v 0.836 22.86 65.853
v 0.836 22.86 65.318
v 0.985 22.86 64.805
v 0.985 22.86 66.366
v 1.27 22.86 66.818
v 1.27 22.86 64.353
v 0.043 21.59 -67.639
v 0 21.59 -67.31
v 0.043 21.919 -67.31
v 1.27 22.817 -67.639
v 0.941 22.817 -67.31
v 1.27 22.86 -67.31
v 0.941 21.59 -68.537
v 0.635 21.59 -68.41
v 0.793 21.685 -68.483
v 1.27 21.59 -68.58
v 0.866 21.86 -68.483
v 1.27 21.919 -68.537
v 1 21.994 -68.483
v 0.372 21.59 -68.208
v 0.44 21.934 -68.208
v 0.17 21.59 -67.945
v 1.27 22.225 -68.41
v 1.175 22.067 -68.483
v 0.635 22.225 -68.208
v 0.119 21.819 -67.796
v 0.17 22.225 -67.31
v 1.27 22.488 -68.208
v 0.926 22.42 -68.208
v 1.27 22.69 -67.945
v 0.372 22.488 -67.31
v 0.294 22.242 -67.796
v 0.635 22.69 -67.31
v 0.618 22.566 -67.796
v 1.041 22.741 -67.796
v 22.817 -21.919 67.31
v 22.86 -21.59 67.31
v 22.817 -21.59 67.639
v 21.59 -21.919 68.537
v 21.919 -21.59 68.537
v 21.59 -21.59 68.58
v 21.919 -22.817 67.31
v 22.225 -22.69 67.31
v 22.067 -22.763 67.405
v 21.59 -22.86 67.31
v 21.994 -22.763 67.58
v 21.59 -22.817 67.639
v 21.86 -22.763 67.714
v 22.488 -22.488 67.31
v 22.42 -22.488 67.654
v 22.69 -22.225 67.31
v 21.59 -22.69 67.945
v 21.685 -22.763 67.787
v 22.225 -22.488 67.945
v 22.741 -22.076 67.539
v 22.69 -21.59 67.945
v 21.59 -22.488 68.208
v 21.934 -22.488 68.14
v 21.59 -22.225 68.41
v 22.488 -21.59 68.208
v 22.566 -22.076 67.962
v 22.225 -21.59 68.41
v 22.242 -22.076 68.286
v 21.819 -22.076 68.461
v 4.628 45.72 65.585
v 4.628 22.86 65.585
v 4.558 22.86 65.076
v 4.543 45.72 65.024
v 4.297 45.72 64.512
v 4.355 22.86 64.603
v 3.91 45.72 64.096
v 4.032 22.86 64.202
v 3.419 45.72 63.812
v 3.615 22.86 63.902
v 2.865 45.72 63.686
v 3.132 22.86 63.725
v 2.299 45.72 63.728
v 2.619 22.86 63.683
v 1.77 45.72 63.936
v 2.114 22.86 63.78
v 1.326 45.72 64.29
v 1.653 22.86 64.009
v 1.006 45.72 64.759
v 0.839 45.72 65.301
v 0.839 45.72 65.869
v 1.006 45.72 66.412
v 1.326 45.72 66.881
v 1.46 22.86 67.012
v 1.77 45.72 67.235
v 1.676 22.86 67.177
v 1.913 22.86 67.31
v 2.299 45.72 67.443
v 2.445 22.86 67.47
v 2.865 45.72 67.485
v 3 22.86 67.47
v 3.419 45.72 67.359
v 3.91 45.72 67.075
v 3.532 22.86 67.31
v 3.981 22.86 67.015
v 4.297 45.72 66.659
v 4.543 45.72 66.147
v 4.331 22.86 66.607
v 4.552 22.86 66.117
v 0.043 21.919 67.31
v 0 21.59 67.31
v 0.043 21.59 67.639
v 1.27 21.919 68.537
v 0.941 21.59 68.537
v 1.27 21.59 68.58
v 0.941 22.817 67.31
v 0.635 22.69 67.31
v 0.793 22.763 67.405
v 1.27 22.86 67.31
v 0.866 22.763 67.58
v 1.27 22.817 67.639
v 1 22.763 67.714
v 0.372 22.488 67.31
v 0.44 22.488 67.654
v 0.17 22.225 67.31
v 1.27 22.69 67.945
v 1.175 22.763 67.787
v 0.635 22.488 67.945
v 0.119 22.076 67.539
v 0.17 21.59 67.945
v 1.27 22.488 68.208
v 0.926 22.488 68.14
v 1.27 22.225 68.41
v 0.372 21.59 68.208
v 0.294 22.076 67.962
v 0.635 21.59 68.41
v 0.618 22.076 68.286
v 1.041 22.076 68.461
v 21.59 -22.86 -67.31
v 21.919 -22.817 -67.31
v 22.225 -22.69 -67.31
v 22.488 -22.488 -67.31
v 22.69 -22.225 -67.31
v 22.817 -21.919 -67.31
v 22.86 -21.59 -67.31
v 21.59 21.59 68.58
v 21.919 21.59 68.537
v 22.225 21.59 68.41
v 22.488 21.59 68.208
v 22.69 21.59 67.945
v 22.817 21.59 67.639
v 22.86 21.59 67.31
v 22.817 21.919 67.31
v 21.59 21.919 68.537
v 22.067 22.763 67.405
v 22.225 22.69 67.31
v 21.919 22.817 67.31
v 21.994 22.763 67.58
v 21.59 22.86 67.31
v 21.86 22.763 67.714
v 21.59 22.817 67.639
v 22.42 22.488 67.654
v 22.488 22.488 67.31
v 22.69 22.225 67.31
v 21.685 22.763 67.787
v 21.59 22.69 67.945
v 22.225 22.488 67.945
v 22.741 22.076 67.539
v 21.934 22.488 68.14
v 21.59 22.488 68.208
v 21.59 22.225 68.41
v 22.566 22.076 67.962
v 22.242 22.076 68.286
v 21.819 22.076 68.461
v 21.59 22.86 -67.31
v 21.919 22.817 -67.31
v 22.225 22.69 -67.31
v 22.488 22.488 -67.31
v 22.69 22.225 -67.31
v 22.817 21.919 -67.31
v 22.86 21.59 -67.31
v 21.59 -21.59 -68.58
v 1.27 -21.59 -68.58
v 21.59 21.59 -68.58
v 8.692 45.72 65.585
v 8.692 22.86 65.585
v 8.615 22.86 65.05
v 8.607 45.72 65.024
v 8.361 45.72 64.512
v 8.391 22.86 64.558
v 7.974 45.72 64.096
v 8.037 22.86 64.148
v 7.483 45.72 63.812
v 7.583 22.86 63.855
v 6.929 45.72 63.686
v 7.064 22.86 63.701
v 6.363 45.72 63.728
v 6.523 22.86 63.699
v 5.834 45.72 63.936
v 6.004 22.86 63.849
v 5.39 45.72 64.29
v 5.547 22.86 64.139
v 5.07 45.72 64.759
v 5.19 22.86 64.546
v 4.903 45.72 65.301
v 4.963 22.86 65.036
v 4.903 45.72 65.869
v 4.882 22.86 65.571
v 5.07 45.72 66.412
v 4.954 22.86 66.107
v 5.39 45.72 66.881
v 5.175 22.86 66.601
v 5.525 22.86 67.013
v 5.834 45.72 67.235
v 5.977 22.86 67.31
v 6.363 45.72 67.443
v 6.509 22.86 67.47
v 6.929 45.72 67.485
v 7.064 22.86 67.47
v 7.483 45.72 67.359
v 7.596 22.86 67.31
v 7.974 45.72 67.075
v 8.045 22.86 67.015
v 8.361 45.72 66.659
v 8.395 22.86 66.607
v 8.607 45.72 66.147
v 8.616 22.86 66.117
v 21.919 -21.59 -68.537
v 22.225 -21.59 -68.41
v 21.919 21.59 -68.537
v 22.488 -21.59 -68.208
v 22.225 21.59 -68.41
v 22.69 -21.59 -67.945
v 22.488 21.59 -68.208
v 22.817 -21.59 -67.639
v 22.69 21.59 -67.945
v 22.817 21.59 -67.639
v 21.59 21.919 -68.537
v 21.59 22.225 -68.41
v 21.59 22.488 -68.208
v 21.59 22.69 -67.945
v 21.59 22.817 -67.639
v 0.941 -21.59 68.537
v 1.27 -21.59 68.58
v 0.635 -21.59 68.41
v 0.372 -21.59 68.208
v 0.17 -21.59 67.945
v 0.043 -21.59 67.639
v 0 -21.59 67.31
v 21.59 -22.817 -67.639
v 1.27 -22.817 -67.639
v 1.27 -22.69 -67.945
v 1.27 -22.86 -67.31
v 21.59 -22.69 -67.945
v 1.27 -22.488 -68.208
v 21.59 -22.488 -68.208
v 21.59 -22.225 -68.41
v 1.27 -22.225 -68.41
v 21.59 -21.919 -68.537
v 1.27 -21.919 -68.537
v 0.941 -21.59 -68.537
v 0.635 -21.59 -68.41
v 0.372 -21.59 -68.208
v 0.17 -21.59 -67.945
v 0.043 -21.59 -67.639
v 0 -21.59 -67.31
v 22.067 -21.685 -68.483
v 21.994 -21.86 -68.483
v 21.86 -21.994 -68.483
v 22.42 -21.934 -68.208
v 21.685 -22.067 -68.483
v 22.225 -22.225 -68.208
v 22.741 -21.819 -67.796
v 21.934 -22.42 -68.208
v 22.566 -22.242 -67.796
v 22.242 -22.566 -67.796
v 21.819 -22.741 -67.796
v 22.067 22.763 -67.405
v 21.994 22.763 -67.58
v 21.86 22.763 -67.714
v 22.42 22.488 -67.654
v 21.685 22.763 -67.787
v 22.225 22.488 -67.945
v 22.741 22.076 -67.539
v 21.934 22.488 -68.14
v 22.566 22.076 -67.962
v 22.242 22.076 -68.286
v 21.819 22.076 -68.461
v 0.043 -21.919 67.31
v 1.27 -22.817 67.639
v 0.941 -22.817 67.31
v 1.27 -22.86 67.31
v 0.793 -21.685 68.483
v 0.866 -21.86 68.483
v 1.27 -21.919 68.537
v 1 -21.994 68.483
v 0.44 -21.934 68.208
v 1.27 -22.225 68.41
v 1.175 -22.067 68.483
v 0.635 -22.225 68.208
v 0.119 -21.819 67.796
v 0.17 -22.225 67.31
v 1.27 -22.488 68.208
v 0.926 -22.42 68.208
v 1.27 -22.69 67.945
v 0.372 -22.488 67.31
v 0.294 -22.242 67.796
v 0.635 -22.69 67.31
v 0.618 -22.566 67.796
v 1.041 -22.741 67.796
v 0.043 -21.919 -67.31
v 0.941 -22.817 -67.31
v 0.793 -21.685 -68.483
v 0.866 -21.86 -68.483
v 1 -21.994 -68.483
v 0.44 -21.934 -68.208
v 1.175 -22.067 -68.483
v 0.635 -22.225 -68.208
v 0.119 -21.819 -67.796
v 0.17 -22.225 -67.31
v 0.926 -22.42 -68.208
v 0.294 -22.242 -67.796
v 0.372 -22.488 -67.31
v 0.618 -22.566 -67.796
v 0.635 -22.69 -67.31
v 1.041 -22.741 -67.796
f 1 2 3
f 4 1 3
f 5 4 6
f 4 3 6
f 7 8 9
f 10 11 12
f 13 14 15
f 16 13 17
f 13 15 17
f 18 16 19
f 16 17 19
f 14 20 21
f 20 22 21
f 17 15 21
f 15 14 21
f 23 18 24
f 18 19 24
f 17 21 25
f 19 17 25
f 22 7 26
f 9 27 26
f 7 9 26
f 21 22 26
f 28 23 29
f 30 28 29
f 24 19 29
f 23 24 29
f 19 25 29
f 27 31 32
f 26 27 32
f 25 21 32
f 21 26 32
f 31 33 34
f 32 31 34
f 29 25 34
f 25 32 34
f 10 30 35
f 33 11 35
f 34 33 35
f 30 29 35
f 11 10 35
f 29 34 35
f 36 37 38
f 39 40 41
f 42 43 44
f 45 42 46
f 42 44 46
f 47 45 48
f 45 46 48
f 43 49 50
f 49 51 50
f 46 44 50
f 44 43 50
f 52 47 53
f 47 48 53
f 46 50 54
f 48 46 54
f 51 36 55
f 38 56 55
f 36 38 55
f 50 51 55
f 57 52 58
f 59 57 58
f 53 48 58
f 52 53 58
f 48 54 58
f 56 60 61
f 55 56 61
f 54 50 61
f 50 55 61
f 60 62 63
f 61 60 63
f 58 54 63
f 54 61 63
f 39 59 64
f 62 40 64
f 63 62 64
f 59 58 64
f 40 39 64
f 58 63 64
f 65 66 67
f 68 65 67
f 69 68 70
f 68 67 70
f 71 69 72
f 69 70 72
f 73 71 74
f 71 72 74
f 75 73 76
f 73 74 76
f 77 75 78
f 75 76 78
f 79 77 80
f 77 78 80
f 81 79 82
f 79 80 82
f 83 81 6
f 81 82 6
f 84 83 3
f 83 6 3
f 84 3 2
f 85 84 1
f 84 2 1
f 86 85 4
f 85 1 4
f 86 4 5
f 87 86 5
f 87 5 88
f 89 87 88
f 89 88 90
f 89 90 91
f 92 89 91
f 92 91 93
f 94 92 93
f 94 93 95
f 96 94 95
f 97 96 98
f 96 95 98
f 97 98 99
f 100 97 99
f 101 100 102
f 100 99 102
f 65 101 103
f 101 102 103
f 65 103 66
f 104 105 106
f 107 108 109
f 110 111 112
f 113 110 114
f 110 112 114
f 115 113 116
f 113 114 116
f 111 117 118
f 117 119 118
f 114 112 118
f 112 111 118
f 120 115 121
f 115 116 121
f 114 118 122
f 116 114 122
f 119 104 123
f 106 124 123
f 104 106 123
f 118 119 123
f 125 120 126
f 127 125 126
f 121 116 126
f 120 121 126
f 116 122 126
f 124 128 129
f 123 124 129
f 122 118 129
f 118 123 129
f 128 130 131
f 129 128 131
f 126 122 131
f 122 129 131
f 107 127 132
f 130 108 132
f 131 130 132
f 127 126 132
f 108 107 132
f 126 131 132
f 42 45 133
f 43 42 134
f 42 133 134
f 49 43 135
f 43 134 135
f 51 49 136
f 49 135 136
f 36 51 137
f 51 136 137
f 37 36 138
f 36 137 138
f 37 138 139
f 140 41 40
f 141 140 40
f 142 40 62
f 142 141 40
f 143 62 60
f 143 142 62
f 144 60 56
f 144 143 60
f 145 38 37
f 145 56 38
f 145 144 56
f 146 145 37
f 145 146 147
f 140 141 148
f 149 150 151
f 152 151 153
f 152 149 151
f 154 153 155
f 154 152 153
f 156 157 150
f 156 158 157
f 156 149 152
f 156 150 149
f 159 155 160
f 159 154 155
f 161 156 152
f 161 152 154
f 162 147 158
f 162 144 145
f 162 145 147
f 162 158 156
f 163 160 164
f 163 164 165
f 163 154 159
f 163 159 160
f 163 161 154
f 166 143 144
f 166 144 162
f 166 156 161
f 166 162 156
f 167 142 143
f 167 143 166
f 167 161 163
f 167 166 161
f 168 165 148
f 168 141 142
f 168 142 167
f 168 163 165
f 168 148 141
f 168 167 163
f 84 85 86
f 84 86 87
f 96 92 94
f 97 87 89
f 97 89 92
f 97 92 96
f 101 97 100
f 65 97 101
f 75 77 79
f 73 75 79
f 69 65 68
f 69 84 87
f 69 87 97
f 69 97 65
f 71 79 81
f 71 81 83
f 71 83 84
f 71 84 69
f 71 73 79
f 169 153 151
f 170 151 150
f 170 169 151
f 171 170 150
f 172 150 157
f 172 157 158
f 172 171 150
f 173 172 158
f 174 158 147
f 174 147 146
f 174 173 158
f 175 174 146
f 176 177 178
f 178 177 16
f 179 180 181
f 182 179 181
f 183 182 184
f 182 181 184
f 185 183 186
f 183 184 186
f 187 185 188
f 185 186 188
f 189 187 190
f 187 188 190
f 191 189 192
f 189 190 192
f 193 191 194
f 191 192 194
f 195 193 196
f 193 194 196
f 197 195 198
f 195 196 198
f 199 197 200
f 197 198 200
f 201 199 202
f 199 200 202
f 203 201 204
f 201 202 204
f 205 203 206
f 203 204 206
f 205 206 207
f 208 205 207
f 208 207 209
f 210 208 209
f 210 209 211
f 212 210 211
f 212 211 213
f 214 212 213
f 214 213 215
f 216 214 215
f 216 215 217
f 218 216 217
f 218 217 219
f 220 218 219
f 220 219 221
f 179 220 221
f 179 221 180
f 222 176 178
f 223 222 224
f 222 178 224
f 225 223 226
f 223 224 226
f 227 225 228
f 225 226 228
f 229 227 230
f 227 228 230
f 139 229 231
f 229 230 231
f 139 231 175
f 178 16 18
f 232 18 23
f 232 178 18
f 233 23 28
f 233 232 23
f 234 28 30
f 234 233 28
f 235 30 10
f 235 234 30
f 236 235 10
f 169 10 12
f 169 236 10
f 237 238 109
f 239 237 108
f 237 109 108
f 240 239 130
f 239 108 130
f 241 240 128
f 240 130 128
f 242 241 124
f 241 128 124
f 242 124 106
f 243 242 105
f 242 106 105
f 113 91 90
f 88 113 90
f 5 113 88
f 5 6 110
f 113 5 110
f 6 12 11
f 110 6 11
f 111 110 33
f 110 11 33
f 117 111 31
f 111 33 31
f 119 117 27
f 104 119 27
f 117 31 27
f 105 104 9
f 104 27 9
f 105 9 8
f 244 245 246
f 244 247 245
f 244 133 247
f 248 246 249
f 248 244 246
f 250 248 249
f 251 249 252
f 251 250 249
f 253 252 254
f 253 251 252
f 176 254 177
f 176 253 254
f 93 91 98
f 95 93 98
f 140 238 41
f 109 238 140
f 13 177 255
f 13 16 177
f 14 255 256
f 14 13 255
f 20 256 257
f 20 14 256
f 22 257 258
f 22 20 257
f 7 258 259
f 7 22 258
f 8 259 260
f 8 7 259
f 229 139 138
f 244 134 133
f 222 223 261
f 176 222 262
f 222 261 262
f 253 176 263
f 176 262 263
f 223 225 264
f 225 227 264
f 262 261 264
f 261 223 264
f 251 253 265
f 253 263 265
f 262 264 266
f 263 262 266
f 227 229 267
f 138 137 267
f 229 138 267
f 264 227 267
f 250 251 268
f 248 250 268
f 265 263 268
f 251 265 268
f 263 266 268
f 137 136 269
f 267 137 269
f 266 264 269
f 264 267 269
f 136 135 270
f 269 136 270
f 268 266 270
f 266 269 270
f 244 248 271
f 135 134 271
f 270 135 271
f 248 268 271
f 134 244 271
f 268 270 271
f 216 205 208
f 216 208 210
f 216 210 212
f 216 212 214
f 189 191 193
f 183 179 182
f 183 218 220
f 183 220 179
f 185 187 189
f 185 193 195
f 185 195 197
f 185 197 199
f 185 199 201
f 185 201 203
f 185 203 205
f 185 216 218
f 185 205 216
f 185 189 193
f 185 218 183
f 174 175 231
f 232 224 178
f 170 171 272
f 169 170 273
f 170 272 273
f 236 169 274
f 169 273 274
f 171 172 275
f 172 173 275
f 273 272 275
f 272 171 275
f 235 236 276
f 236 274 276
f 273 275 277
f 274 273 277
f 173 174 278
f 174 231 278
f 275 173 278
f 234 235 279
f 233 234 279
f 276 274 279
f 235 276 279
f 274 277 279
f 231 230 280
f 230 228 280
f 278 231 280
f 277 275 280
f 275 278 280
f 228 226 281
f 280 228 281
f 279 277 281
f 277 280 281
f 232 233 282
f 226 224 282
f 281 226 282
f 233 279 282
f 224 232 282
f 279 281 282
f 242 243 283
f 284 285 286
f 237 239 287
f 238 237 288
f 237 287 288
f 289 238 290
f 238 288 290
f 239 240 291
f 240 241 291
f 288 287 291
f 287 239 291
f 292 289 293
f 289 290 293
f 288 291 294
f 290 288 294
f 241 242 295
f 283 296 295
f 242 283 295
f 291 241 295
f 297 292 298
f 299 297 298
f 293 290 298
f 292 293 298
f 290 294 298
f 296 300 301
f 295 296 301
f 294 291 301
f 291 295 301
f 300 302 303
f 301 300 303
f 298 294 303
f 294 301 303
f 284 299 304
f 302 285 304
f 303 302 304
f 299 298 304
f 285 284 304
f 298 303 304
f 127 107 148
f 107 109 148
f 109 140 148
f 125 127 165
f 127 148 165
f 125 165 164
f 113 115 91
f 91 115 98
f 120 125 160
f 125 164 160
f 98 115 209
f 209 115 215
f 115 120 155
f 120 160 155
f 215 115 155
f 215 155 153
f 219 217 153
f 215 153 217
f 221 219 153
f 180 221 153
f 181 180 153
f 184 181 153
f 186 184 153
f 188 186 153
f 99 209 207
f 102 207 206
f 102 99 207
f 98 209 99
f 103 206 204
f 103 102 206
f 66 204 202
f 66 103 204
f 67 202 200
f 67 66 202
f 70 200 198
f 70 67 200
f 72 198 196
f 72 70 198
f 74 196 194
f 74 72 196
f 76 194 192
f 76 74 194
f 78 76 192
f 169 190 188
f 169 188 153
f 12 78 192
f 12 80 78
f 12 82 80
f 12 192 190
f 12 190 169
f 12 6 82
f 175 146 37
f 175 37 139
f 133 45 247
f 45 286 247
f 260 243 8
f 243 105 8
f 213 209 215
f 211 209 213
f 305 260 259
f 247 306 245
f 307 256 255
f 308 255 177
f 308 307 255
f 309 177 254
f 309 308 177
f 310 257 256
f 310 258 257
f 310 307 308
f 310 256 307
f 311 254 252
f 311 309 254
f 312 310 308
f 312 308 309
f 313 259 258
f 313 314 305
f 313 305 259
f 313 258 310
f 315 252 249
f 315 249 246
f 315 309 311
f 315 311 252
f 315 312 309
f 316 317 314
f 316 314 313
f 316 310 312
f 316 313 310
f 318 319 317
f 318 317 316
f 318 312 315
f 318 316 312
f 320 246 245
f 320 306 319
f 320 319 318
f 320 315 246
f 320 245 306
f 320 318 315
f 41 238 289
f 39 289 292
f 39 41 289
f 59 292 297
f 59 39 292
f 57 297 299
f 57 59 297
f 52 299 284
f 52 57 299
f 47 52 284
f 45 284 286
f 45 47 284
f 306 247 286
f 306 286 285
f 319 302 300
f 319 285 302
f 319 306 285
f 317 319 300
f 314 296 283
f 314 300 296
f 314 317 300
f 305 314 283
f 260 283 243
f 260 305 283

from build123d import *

# Parameters (mm, degrees)
SKETCH1_W           = 137.16
SKETCH1_H           = 45.72
BOSS_EXTRUDE1_DEPTH = 22.86
FILLET1_R           = 1.27
SKETCH2_R           = 1.905
BOSS_EXTRUDE2_DEPTH = 22.86


with BuildPart() as part:
    # Sketch1 → Boss-Extrude1 (new body)
    with BuildSketch(Plane(origin=(0, 0, 0), x_dir=(0, 0, -1), z_dir=(1, 0, 0))):
        Rectangle(SKETCH1_W, SKETCH1_H)
    extrude(amount=BOSS_EXTRUDE1_DEPTH)

    # Fillet1
    fillet1_edges = [part.edges().sort_by_distance(p)[0] for p in [
        (22.86, 0, 68.58),
        (22.86, -22.86, 0),
        (22.86, 0, -68.58),
        (0, -22.86, 0),
        (0, 0, 68.58),
        (0, 22.86, 0),
        (0, 0, -68.58),
        (22.86, 22.86, 0),
        (11.43, -22.86, -68.58),
        (11.43, -22.86, 68.58),
        (11.43, 22.86, 68.58),
        (11.43, 22.86, -68.58),
    ]]
    fillet(fillet1_edges, radius=FILLET1_R)

    # Sketch2 → Boss-Extrude2 (add)
    with BuildSketch(Plane(origin=(0, 22.86, 0), x_dir=(1, 0, 0), z_dir=(0, 1, 0))):
        with Locations((2.722644531, -65.585417965)):
            Circle(SKETCH2_R)
        with Locations((6.786644531, -65.585417965)):
            Circle(SKETCH2_R)
    extrude(amount=BOSS_EXTRUDE2_DEPTH)


solid = part.part
